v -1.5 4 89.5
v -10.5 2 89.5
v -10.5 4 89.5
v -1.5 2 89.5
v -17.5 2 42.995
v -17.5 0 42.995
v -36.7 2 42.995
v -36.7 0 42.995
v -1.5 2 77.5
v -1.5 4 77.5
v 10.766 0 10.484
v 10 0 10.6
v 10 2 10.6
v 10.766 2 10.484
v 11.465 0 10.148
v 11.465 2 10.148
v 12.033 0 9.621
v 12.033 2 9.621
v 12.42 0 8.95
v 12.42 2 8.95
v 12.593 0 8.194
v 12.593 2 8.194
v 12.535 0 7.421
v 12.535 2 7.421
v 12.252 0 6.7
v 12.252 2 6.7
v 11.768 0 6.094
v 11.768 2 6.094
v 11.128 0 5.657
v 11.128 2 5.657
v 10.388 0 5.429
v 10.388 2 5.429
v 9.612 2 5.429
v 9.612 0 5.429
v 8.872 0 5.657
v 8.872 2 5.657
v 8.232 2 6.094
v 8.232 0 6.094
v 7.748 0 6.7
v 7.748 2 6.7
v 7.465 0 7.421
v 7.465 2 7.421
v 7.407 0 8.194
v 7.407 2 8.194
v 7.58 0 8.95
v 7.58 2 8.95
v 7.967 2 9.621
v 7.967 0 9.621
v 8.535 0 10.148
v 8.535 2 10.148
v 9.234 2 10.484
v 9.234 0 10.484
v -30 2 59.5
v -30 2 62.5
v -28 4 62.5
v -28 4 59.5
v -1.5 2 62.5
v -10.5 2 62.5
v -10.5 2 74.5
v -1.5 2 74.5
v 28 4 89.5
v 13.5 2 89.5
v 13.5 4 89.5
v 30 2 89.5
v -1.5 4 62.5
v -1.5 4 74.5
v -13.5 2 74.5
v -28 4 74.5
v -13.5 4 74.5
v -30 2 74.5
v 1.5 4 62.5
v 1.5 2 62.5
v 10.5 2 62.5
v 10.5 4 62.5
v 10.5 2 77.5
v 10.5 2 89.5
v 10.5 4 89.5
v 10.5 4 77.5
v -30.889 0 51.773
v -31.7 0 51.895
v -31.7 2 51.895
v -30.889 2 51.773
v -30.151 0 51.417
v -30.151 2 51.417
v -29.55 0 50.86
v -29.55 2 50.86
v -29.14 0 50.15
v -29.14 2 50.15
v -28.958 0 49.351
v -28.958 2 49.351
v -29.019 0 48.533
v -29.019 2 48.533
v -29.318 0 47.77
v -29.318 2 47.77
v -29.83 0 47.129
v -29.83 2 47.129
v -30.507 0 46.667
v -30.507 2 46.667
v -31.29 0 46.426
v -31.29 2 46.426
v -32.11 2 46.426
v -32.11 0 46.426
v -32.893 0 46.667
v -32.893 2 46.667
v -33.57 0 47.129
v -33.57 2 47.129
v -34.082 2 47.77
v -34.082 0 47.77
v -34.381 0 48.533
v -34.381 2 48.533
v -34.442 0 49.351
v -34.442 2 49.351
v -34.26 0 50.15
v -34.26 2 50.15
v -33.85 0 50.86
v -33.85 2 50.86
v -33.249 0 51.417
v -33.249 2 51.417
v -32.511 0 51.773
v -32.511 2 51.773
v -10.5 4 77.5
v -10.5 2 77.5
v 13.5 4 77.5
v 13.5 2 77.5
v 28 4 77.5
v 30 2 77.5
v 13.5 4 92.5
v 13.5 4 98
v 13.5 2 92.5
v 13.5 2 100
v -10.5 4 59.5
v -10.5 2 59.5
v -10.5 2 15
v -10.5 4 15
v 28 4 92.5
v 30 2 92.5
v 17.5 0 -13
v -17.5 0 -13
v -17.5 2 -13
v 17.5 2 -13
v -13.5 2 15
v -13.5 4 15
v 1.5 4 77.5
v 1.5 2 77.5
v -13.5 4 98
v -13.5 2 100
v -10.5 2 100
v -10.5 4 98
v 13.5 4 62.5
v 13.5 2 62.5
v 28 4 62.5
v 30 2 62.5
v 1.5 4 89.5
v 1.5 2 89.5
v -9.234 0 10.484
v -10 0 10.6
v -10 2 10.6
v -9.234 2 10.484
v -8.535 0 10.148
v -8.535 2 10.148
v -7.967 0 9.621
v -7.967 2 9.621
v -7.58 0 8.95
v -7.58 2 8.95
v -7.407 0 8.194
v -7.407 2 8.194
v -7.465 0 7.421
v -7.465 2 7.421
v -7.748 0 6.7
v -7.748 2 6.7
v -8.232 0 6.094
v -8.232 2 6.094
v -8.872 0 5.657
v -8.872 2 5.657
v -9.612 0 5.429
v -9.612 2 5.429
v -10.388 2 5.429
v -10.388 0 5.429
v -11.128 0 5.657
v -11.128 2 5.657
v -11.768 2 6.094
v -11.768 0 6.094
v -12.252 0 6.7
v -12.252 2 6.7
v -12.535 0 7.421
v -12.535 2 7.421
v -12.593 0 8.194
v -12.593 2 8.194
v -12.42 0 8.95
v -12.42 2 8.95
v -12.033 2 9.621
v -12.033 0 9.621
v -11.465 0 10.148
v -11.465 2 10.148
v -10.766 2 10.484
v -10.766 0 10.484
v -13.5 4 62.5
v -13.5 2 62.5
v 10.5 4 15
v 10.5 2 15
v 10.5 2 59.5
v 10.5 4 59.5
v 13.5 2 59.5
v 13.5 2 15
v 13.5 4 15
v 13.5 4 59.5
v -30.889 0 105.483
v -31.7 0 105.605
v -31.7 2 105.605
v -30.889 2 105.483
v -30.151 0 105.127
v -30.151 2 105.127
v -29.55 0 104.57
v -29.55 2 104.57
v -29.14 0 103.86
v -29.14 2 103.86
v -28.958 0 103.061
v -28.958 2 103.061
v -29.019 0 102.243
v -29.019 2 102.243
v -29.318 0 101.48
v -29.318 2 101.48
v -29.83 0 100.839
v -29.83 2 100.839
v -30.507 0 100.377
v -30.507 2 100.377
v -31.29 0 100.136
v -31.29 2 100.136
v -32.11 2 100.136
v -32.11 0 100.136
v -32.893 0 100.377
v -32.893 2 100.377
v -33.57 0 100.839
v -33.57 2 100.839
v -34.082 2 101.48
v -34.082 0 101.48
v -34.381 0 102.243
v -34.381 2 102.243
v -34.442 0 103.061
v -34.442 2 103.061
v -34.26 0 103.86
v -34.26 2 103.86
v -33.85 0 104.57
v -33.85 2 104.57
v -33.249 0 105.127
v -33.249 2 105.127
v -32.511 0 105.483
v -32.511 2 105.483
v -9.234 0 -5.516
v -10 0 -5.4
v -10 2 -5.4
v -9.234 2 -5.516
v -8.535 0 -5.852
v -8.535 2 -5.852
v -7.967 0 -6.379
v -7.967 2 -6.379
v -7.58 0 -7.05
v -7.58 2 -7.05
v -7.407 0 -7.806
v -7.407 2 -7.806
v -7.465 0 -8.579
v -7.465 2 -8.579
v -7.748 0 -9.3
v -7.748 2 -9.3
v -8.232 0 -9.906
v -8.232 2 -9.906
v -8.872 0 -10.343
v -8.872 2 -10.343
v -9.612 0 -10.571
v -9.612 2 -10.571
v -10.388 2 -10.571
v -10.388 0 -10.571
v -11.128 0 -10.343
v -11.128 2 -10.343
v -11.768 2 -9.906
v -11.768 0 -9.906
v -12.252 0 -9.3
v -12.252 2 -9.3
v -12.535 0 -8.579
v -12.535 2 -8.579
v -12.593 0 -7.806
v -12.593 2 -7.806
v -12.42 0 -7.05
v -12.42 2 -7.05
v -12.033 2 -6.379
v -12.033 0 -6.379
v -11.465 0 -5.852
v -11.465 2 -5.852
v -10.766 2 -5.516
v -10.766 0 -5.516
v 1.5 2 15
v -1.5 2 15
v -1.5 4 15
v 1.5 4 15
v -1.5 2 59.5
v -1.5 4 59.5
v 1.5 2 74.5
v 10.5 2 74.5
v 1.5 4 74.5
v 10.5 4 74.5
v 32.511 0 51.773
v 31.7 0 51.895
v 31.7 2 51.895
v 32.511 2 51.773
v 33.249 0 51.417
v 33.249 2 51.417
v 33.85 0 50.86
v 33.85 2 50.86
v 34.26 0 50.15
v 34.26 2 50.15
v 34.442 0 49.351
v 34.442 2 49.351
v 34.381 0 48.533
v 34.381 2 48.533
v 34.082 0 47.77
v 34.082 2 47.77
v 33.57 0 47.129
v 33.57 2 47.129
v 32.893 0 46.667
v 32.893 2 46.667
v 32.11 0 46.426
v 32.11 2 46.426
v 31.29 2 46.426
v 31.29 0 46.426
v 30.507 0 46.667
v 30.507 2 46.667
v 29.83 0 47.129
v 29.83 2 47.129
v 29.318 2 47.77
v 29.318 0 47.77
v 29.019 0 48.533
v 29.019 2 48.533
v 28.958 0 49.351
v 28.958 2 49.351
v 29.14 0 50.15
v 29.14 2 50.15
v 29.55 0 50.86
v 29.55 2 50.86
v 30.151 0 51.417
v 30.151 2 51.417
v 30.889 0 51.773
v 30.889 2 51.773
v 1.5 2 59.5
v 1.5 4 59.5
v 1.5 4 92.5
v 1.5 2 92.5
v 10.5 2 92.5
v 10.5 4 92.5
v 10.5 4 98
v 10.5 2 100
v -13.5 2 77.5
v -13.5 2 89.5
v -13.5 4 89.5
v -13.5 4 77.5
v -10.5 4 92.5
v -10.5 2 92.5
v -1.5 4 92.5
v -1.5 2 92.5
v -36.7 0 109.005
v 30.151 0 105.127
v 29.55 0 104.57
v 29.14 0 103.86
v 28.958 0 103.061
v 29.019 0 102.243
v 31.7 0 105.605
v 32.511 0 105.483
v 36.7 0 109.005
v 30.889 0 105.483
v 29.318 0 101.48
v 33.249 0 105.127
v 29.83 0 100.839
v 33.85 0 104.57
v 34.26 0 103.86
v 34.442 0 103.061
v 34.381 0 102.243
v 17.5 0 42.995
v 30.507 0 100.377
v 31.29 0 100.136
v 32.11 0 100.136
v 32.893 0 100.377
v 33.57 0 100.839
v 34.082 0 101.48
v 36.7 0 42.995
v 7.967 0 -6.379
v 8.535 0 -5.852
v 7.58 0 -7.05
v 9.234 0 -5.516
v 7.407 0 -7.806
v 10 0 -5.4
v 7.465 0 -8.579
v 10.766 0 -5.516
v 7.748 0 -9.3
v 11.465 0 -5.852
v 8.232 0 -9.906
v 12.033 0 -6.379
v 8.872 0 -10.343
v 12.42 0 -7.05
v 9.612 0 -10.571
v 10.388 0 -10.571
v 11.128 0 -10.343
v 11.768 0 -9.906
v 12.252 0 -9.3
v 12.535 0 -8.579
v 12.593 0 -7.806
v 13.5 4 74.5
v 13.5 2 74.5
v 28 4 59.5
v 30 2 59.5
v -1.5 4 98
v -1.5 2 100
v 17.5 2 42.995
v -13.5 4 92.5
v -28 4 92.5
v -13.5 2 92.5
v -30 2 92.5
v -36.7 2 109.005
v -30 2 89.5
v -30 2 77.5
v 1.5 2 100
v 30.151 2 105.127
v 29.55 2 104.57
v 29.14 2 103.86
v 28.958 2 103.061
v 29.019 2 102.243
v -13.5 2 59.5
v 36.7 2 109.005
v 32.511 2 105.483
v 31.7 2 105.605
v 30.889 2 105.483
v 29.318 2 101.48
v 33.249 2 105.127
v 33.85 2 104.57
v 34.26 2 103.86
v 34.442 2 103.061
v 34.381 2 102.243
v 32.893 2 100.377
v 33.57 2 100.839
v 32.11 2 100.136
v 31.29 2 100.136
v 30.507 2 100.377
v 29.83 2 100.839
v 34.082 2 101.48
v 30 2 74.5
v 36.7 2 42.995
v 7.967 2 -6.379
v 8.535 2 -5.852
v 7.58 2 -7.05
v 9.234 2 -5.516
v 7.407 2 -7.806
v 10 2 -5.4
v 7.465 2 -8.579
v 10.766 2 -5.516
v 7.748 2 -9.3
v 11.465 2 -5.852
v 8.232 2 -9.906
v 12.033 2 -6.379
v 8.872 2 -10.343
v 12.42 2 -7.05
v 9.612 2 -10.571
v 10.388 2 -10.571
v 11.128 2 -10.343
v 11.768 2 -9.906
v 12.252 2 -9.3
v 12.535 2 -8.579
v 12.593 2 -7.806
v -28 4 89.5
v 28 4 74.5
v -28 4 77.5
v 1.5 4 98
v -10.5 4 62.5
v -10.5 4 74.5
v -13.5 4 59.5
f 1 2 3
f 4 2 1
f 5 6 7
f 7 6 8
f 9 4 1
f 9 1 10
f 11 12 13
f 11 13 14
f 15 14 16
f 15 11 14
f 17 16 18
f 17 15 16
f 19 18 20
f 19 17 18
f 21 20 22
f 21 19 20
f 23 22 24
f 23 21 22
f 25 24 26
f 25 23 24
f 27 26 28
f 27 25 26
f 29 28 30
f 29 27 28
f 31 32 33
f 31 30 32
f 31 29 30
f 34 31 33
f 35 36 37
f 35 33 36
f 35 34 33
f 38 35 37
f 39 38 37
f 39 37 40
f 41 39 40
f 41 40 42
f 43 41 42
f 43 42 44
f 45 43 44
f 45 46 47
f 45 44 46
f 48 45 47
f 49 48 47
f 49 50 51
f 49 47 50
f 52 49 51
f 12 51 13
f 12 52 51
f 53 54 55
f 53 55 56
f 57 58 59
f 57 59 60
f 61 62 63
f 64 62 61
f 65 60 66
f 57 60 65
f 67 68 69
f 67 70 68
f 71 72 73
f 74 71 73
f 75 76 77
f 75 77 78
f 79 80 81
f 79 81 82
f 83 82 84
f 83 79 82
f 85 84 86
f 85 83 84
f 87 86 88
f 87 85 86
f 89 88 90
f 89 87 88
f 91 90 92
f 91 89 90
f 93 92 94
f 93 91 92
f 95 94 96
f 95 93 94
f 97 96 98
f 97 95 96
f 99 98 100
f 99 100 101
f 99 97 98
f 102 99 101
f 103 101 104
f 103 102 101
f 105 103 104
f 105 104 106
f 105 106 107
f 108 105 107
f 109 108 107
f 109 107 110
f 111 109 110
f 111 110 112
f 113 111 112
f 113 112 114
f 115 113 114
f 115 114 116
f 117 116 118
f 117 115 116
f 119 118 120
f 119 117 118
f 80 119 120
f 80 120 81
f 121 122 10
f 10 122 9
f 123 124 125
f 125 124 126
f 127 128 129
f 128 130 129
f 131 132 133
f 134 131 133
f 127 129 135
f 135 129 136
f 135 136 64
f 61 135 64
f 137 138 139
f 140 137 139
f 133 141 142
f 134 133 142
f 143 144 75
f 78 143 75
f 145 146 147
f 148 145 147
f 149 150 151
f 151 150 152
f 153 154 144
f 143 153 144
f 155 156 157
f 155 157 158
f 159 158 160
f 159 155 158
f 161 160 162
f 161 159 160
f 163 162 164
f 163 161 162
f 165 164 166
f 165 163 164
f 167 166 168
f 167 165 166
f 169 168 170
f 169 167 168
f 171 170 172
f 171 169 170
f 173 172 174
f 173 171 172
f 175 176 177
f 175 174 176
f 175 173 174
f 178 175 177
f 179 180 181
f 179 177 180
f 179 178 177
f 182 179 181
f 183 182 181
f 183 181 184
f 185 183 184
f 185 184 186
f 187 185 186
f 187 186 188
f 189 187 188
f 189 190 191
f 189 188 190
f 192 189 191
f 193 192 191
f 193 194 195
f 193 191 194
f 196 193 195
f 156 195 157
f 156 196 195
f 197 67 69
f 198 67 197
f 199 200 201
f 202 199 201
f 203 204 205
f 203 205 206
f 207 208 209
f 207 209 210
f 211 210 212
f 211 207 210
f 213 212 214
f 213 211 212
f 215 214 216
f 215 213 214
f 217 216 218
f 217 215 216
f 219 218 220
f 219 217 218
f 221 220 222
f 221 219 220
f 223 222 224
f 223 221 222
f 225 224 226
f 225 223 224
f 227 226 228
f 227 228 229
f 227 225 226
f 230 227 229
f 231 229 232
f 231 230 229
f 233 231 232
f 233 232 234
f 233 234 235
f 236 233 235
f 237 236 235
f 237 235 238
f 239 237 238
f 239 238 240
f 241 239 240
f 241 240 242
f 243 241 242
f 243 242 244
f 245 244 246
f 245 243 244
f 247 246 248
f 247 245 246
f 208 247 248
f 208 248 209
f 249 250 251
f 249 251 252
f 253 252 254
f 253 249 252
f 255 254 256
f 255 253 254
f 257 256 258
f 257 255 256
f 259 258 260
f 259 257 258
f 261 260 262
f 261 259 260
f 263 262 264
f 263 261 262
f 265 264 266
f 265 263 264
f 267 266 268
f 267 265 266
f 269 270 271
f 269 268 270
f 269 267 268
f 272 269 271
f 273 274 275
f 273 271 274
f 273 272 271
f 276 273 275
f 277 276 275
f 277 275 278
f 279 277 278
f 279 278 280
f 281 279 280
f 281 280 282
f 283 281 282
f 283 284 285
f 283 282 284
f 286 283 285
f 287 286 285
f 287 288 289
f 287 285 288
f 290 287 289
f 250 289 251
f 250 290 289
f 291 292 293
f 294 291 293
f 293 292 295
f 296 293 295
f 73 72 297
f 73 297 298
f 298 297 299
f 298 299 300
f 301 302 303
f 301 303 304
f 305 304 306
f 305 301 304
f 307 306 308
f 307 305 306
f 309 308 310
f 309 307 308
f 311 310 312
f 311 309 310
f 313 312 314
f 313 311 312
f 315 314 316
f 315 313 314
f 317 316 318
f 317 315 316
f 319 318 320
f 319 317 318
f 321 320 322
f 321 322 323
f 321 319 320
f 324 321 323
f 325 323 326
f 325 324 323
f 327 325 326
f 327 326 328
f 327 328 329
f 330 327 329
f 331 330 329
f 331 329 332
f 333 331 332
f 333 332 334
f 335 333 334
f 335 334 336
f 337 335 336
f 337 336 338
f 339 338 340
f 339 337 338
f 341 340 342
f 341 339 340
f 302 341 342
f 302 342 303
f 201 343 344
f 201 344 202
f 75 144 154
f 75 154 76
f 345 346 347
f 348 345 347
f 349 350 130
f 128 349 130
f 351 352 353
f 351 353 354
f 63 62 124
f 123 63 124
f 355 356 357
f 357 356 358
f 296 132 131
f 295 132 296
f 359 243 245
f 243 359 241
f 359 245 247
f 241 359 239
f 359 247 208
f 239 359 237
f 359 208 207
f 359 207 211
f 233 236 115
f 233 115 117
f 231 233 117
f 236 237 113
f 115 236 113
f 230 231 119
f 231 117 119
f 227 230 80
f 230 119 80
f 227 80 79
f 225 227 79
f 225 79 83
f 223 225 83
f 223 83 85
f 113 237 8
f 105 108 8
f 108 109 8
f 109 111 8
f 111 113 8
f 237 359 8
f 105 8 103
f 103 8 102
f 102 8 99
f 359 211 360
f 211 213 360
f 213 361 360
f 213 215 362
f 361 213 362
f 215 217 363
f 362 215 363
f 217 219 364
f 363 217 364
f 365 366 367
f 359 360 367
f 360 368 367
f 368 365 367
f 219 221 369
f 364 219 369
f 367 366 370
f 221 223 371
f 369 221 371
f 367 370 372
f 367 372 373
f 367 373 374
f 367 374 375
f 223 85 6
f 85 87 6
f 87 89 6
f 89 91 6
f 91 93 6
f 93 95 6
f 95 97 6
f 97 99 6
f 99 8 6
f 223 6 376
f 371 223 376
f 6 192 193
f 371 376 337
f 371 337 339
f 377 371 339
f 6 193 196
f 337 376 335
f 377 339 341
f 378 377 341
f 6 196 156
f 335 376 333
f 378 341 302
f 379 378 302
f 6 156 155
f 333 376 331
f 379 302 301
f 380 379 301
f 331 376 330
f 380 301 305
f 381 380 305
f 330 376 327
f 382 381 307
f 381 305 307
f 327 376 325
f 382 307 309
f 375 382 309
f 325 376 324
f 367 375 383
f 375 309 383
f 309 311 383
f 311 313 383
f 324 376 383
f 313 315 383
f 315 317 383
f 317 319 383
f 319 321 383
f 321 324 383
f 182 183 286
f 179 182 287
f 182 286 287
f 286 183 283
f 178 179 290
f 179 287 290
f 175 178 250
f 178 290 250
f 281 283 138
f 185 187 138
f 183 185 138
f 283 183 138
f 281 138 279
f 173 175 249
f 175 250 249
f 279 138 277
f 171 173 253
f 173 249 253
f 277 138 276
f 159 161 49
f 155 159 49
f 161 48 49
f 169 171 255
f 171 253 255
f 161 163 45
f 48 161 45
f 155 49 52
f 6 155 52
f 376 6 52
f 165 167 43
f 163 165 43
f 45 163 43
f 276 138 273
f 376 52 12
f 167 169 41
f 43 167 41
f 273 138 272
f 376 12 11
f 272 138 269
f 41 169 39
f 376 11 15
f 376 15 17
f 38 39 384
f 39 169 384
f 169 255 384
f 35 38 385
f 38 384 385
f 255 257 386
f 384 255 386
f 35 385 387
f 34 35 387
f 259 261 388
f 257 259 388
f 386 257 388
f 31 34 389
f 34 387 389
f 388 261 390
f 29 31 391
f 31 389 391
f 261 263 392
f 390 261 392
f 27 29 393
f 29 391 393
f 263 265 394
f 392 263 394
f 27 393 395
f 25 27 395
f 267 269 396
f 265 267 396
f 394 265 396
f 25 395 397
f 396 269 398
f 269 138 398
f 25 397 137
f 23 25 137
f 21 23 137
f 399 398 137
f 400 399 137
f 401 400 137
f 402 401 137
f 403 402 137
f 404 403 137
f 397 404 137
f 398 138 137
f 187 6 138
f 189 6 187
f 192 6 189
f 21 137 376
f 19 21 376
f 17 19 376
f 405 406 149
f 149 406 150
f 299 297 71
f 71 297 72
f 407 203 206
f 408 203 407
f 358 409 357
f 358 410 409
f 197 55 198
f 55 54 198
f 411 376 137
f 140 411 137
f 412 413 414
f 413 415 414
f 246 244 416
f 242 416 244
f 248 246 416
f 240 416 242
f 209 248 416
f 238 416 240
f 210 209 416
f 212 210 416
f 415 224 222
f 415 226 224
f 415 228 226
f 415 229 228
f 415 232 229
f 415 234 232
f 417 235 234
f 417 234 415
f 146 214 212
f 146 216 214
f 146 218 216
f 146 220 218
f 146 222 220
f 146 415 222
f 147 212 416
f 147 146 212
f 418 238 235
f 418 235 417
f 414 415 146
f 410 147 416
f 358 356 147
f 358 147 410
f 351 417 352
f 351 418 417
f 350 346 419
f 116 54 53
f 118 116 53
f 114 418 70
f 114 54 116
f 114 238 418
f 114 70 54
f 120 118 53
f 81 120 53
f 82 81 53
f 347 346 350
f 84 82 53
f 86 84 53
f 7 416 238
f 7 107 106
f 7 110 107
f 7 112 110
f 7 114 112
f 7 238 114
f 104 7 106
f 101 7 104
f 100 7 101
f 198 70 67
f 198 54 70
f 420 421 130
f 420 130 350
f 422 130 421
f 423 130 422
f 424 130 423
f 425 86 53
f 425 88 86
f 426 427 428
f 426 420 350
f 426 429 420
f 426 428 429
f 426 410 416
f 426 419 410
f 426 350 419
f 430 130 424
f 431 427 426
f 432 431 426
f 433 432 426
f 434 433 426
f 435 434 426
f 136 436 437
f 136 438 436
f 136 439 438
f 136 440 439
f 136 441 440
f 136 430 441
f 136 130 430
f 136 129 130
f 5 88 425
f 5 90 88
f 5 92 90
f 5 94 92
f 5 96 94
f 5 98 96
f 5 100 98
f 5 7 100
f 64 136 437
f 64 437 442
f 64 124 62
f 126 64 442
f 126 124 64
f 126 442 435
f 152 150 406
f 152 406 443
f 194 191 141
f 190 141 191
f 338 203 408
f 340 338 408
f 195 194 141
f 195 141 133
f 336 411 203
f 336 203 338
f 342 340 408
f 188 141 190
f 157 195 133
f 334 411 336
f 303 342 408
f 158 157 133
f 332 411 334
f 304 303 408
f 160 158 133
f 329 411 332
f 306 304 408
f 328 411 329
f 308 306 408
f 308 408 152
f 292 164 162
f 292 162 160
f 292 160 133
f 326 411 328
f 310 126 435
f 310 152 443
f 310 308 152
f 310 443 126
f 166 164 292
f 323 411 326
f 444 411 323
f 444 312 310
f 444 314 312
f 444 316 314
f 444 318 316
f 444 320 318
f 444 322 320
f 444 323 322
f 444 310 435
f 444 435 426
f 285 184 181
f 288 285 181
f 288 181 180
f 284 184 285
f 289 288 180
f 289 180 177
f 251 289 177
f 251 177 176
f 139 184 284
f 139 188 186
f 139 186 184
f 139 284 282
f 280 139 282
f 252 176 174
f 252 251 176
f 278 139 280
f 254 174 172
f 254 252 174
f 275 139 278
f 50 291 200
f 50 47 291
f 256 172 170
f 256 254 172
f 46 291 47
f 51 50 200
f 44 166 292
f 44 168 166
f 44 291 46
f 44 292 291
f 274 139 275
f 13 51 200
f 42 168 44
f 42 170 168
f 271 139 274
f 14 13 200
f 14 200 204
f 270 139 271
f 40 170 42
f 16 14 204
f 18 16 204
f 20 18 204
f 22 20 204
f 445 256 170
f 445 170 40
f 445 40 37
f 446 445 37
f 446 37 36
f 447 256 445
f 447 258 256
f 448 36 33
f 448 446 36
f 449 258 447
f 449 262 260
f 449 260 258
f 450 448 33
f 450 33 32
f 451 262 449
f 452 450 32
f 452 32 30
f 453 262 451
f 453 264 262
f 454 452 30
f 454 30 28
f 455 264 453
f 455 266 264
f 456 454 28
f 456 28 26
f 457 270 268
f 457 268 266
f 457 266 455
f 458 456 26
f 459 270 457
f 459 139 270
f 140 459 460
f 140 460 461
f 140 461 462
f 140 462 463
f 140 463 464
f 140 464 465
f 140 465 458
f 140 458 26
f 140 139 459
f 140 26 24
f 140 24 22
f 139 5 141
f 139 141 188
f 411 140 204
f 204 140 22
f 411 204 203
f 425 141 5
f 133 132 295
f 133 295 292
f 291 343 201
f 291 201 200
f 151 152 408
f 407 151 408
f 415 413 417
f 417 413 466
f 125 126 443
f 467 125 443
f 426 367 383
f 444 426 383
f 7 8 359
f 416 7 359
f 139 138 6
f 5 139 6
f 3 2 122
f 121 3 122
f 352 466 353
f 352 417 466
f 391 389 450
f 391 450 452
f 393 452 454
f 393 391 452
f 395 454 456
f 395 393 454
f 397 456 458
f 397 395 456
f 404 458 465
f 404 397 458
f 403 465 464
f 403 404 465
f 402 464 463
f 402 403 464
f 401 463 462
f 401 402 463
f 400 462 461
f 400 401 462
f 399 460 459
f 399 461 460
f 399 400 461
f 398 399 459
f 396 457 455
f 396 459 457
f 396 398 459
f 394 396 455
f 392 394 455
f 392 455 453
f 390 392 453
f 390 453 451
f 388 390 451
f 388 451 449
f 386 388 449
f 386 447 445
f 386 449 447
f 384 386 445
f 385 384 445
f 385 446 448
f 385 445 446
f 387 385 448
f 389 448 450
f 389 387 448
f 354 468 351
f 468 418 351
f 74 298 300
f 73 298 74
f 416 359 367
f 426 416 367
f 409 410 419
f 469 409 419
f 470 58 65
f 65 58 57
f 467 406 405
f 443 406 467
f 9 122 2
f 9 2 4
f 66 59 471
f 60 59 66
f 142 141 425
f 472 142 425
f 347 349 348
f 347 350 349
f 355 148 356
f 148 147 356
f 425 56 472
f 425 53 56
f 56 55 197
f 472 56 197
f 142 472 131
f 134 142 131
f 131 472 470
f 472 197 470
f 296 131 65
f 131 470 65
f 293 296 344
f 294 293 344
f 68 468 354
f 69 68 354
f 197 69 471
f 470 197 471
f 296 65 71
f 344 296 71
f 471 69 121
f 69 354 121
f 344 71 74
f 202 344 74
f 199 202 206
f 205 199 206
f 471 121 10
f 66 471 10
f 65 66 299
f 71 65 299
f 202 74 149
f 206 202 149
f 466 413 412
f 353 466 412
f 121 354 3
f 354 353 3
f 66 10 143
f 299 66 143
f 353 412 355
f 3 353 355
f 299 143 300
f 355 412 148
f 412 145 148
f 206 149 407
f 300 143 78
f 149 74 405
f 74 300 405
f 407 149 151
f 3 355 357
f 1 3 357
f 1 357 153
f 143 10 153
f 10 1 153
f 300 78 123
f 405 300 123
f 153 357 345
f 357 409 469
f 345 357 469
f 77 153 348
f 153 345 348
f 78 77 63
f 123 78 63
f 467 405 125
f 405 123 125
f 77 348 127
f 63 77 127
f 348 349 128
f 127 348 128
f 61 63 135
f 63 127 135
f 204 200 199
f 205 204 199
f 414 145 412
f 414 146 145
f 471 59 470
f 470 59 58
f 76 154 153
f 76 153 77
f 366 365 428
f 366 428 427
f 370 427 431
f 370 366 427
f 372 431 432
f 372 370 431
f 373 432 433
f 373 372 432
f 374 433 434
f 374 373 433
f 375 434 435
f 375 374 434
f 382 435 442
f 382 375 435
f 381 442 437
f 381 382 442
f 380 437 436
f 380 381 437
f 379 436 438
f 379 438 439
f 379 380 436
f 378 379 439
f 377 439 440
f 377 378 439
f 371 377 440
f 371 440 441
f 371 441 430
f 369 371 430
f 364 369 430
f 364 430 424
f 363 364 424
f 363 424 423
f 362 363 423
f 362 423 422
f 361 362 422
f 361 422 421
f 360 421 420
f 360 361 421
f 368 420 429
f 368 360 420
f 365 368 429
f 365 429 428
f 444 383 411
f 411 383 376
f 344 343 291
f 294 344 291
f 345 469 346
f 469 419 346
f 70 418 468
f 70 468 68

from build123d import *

# Parameters (mm, degrees)
SKETCH1_R                = 2.75
BOSS_EXTRUDE1_DEPTH      = 2
SKETCH2_W                = 3
SKETCH2_H                = 100
BOSS_EXTRUDE2_DEPTH      = 2
SKETCH3_W                = 60
SKETCH3_H                = 3
BOSS_EXTRUDE3_DEPTH      = 2
CHAMFER1_SIZE            = 2
CHAMFER1_OF_MIRROR1_SIZE = 2
CUT_EXTRUDE2_DEPTH       = 122.80201158
CUT_EXTRUDE2_DEPTH_BACK  = 122.80201158
CUT_EXTRUDE3_DEPTH       = 116.034690529
CUT_EXTRUDE3_DEPTH_BACK  = 116.034690529
SKETCH5_R                = 2.6


with BuildPart() as part:
    # Sketch1 → Boss-Extrude1 (new body)
    with BuildSketch(Plane(origin=(0, 0, 0), x_dir=(1, 0, 0), z_dir=(0, 1, 0))):
        Polygon((-17.5, 42.995), (-17.5, -42.995), (-36.7, -42.995), (-36.7, -109.005), (36.7, -109.005), (36.7, -42.995), (17.5, -42.995), (17.5, 42.995), (36.7, 42.995), (36.7, 109.005), (-36.7, 109.005), (-36.7, 42.995), align=None)
        with Locations(Location((-31.7, 102.855, 0), (0, 0, 270))):
            Circle(SKETCH1_R, mode=Mode.SUBTRACT)
        with Locations(Location((-31.7, 49.145, 0), (0, 0, 270))):
            Circle(SKETCH1_R, mode=Mode.SUBTRACT)
        with Locations(Location((31.7, 49.145, 0), (0, 0, 270))):
            Circle(SKETCH1_R, mode=Mode.SUBTRACT)
        with Locations(Location((31.7, 102.855, 0), (0, 0, 270))):
            Circle(SKETCH1_R, mode=Mode.SUBTRACT)
        with Locations(Location((31.7, -102.855, 0), (0, 0, 270))):
            Circle(SKETCH1_R, mode=Mode.SUBTRACT)
        with Locations(Location((31.7, -49.145, 0), (0, 0, 270))):
            Circle(SKETCH1_R, mode=Mode.SUBTRACT)
        with Locations(Location((-31.7, -49.145, 0), (0, 0, 270))):
            Circle(SKETCH1_R, mode=Mode.SUBTRACT)
        with Locations(Location((-31.7, -102.855, 0), (0, 0, 270))):
            Circle(SKETCH1_R, mode=Mode.SUBTRACT)
    extrude(amount=BOSS_EXTRUDE1_DEPTH)

    # Sketch2 → Boss-Extrude2 (add)
    with BuildSketch(Plane(origin=(0, 2, 0), x_dir=(1, 0, 0), z_dir=(0, 1, 0))):
        with Locations((12, -50)):
            Rectangle(SKETCH2_W, SKETCH2_H)
        with Locations((0, -50)):
            Rectangle(SKETCH2_W, SKETCH2_H)
        with Locations((-12, -50)):
            Rectangle(SKETCH2_W, SKETCH2_H)
    boss_extrude2 = extrude(amount=BOSS_EXTRUDE2_DEPTH)

    # Sketch3 → Boss-Extrude3 (add)
    with BuildSketch(Plane(origin=(0, 2, 0), x_dir=(1, 0, 0), z_dir=(0, 1, 0))):
        with Locations((0, -91)):
            Rectangle(SKETCH3_W, SKETCH3_H)
        with Locations((0, -61)):
            Rectangle(SKETCH3_W, SKETCH3_H)
        with Locations((0, -76)):
            Rectangle(SKETCH3_W, SKETCH3_H)
    boss_extrude3 = extrude(amount=BOSS_EXTRUDE3_DEPTH)

    # Chamfer1
    chamfer1_edges = [part.edges().sort_by_distance(p)[0] for p in [
        (30, 4, 61),
        (30, 4, 76),
        (30, 4, 91),
        (12, 4, 100),
        (0, 4, 100),
        (-12, 4, 100),
        (-30, 4, 91),
        (-30, 4, 76),
        (-30, 4, 61),
    ]]
    chamfer(chamfer1_edges, length=CHAMFER1_SIZE - 0.0001)  # a hair under: the kernel refuses the full size

    # Mirror1: Boss-Extrude2, Boss-Extrude3 across plane
    add(boss_extrude2.mirror(Plane.XY))
    add(boss_extrude3.mirror(Plane.XY))

    # Chamfer1 of Mirror1
    chamfer1_of_mirror1_edges = [part.edges().sort_by_distance(p)[0] for p in [
        (30, 4, -61),
        (30, 4, -76),
        (30, 4, -91),
        (12, 4, -100),
        (0, 4, -100),
        (-12, 4, -100),
        (-30, 4, -91),
        (-30, 4, -76),
        (-30, 4, -61),
    ]]
    chamfer(chamfer1_of_mirror1_edges, length=CHAMFER1_OF_MIRROR1_SIZE - 0.0001)  # a hair under: the kernel refuses the full size

    # Sketch4 → Cut-Extrude2 (cut, two sides: drawn at the far end of the back side and taken through both)
    with BuildSketch(Plane(origin=(17.5, 0, 0), x_dir=(0, 0, -1), z_dir=(1, 0, 0)).offset(-CUT_EXTRUDE2_DEPTH_BACK)):
        Polygon((13, 0), (13, 2), (-15, 2), (-15, 4), (109.005, 4), (109.005, 0), align=None)
    extrude(amount=CUT_EXTRUDE2_DEPTH + CUT_EXTRUDE2_DEPTH_BACK, mode=Mode.SUBTRACT)

    # Sketch5 → Cut-Extrude3 (cut, two sides: drawn at the far end of the back side and taken through both)
    with BuildSketch(Plane(origin=(0, 2, 0), x_dir=(1, 0, 0), z_dir=(0, 1, 0)).offset(-CUT_EXTRUDE3_DEPTH_BACK)):
        with Locations(Location((10, -8, 0), (0, 0, 270))):
            Circle(SKETCH5_R)
        with Locations(Location((10, 8, 0), (0, 0, 270))):
            Circle(SKETCH5_R)
        with Locations(Location((-10, 8, 0), (0, 0, 270))):
            Circle(SKETCH5_R)
        with Locations(Location((-10, -8, 0), (0, 0, 270))):
            Circle(SKETCH5_R)
    extrude(amount=CUT_EXTRUDE3_DEPTH + CUT_EXTRUDE3_DEPTH_BACK, mode=Mode.SUBTRACT)


solid = part.part
